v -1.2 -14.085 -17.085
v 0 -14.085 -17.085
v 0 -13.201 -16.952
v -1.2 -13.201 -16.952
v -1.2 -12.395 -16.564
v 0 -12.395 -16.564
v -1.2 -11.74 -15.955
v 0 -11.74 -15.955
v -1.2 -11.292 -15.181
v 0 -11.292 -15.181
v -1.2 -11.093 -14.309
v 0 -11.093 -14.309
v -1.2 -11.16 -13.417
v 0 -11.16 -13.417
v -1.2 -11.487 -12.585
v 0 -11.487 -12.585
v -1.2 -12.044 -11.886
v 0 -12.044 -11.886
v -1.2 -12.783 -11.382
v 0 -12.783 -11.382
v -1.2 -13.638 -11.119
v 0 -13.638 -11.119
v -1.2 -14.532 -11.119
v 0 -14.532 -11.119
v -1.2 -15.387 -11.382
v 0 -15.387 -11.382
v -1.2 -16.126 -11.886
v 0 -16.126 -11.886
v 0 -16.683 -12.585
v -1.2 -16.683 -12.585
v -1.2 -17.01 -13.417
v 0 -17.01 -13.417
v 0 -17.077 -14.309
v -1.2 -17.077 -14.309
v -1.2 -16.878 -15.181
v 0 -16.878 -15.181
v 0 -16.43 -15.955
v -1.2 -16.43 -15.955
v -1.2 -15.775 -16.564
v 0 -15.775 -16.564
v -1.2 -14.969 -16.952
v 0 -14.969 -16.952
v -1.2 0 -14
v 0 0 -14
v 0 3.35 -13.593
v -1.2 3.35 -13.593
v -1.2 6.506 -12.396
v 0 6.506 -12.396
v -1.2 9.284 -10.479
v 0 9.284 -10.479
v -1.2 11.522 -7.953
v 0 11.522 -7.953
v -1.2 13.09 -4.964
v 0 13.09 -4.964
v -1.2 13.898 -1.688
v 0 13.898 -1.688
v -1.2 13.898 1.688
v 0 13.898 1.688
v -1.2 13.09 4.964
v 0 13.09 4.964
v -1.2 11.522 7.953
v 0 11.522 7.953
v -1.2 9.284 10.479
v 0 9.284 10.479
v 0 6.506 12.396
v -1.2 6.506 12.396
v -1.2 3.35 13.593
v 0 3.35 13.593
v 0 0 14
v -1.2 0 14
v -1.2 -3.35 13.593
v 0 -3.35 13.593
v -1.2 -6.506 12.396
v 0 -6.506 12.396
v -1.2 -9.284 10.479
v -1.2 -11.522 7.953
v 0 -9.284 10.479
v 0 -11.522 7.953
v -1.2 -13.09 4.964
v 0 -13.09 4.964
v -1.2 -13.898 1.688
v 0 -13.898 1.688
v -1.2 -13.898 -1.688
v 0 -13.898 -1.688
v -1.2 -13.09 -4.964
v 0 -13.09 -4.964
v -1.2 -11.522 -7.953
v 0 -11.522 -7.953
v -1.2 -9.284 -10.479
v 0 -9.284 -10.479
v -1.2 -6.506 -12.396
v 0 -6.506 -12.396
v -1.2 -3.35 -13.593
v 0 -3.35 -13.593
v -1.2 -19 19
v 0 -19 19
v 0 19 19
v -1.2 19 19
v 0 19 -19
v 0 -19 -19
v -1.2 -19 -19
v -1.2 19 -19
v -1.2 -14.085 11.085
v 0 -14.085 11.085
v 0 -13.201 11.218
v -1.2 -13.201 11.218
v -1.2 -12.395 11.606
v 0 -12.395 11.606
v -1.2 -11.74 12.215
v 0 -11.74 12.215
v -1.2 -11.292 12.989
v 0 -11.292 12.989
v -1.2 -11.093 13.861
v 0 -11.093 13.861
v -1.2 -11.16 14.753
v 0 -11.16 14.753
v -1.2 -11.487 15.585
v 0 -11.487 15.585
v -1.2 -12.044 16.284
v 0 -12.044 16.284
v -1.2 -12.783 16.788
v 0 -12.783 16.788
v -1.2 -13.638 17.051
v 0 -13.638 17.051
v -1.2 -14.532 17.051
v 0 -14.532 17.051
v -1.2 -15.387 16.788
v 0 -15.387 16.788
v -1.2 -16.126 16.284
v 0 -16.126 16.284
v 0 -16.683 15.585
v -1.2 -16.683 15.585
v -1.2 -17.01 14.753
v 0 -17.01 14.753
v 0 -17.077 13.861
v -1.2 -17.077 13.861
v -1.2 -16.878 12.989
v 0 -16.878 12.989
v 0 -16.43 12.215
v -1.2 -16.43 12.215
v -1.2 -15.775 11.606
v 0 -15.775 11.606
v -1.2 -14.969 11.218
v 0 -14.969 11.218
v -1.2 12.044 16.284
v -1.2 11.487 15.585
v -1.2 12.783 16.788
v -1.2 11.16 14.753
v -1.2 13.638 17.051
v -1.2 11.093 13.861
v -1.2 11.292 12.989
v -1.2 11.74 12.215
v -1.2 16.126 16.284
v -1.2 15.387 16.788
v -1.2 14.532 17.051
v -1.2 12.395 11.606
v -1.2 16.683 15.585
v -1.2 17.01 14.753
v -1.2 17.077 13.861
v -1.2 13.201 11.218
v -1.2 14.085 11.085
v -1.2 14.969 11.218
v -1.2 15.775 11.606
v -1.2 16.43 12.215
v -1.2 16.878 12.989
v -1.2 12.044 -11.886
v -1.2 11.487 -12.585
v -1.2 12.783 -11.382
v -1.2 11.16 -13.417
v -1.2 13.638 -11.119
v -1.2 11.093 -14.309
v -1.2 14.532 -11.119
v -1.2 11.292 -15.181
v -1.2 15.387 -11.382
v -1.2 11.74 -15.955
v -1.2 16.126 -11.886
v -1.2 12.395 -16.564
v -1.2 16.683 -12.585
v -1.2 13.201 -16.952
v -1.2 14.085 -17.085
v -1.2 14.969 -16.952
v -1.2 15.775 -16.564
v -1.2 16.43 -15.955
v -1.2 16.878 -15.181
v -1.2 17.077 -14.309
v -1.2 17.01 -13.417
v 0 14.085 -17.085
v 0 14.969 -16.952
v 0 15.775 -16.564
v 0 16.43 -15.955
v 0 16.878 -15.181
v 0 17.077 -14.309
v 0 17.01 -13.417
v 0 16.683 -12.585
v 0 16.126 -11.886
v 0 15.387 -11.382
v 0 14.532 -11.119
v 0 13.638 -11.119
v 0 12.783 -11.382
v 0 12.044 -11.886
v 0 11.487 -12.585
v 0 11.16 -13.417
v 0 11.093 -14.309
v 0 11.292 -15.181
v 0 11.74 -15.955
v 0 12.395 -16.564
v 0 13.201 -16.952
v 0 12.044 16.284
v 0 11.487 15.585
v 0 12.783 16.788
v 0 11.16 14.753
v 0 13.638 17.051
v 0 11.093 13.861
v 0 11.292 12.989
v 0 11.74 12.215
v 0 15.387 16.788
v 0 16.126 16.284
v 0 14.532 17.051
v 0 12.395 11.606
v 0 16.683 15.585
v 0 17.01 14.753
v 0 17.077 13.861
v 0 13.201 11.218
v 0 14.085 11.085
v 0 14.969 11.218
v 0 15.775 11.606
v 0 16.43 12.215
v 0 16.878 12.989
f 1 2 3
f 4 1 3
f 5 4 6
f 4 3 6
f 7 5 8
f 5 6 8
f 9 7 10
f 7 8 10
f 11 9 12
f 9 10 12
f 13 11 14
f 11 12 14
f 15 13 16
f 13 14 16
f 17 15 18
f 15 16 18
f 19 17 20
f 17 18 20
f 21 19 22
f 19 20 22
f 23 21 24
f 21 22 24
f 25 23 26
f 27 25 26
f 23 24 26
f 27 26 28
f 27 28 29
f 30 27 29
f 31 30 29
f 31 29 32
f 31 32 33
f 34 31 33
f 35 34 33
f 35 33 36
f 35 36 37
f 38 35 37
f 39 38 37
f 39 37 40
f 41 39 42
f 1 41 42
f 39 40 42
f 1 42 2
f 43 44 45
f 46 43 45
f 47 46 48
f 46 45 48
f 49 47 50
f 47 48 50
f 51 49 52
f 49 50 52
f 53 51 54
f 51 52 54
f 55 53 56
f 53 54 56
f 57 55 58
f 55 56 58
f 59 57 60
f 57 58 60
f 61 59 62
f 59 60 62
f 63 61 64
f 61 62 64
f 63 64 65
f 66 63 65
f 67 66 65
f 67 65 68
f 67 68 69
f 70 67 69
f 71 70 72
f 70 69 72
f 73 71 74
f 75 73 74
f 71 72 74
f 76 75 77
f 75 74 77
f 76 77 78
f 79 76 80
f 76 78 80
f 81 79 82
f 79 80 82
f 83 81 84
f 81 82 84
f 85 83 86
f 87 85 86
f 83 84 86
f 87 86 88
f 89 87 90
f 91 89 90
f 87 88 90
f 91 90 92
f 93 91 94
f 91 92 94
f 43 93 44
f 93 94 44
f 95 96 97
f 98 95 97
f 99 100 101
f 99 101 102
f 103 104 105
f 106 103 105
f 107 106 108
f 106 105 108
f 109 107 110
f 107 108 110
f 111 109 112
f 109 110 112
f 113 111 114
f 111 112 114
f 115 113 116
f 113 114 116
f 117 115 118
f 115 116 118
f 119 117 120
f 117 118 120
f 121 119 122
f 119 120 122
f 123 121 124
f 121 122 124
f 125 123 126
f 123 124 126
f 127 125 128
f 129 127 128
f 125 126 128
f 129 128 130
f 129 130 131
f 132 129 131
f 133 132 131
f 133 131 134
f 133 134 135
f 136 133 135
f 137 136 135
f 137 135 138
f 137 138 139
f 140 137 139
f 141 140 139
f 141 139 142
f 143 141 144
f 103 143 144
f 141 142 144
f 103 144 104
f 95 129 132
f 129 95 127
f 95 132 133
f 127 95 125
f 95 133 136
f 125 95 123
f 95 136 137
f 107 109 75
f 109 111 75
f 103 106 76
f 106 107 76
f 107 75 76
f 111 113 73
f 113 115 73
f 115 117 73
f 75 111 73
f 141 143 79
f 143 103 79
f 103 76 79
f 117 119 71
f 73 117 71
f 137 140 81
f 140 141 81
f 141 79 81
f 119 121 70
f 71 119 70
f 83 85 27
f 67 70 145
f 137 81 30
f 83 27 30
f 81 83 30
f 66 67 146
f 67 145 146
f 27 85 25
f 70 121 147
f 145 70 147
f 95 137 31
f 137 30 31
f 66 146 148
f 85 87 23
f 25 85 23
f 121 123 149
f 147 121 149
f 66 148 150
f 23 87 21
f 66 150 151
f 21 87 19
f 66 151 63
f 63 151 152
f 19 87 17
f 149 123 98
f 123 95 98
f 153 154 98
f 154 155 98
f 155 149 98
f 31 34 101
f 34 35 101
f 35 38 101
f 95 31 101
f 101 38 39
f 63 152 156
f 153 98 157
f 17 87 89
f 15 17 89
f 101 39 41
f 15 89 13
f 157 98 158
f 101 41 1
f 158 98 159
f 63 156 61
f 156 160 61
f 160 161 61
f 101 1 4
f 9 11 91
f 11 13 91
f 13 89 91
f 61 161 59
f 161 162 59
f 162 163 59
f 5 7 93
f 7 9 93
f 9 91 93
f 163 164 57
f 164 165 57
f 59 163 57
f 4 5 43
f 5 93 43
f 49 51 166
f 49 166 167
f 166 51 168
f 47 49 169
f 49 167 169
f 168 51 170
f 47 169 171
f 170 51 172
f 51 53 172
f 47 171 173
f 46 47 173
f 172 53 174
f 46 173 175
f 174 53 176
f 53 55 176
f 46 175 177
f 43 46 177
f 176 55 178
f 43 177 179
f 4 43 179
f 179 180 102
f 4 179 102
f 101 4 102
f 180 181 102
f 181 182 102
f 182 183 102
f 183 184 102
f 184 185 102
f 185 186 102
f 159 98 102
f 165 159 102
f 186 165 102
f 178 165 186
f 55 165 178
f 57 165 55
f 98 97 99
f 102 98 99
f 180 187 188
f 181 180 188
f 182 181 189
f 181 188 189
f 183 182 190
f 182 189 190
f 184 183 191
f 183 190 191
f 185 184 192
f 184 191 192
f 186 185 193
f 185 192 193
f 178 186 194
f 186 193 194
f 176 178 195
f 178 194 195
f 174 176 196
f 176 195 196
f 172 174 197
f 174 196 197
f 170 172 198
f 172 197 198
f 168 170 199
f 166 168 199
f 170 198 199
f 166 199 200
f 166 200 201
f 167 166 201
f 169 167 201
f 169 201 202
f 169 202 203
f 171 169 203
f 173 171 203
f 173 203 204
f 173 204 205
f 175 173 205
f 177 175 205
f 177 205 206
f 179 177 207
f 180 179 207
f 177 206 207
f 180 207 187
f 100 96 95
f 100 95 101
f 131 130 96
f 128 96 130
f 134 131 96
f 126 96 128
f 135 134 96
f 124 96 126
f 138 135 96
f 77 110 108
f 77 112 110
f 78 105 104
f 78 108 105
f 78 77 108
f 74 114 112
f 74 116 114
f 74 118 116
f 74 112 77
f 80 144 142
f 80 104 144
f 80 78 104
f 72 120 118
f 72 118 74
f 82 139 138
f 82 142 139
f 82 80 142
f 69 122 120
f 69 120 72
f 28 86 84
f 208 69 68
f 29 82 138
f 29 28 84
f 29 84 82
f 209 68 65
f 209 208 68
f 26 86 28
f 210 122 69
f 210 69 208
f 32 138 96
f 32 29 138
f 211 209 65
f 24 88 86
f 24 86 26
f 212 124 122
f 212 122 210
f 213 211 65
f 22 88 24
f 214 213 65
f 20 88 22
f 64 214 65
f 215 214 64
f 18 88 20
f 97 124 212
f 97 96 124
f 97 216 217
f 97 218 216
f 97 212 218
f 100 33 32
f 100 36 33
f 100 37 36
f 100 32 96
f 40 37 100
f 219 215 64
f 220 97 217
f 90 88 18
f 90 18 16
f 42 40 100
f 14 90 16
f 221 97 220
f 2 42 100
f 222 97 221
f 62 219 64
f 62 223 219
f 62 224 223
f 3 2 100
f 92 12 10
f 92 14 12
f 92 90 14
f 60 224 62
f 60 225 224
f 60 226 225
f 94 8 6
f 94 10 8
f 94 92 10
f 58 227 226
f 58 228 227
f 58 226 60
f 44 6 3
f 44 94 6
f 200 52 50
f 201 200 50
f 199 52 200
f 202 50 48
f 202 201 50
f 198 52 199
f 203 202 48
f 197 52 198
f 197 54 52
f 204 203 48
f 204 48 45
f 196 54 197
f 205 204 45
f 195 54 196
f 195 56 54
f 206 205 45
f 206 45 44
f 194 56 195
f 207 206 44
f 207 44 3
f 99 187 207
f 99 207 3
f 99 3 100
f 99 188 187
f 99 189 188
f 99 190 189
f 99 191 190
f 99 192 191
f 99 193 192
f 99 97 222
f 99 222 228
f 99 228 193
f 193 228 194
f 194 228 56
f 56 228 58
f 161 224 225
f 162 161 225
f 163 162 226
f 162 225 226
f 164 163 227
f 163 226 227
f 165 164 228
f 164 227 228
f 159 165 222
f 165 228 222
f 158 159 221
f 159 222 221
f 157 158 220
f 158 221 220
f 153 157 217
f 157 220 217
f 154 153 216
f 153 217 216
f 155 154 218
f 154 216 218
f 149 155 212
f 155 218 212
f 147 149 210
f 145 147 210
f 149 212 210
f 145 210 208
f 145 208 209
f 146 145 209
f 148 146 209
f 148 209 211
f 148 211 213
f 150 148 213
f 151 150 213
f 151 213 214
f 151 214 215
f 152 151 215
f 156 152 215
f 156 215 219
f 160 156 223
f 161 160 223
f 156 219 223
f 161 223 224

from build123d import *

# Parameters (mm, degrees)
CROQUIS2_W        = 38
CROQUIS2_H        = 38
CROQUIS2_R        = 14
CROQUIS2_R_2      = 3
BRIDA_BASE1_DEPTH = 1.2


# Sheet-metal steps are written as plain solids
with BuildPart() as part:
    # Croquis2 → Brida base1 (new body)
    with BuildSketch(Plane(origin=(0, 0, 0), x_dir=(0, 0, -1), z_dir=(1, 0, 0))):
        Rectangle(CROQUIS2_W, CROQUIS2_H)
        Circle(CROQUIS2_R, mode=Mode.SUBTRACT)
        with Locations((-14.085, -14.085)):
            Circle(CROQUIS2_R_2, mode=Mode.SUBTRACT)
        with Locations((-14.085, 14.085)):
            Circle(CROQUIS2_R_2, mode=Mode.SUBTRACT)
        with Locations((14.085, 14.085)):
            Circle(CROQUIS2_R_2, mode=Mode.SUBTRACT)
        with Locations((14.085, -14.085)):
            Circle(CROQUIS2_R_2, mode=Mode.SUBTRACT)
    extrude(amount=-BRIDA_BASE1_DEPTH)


solid = part.part
